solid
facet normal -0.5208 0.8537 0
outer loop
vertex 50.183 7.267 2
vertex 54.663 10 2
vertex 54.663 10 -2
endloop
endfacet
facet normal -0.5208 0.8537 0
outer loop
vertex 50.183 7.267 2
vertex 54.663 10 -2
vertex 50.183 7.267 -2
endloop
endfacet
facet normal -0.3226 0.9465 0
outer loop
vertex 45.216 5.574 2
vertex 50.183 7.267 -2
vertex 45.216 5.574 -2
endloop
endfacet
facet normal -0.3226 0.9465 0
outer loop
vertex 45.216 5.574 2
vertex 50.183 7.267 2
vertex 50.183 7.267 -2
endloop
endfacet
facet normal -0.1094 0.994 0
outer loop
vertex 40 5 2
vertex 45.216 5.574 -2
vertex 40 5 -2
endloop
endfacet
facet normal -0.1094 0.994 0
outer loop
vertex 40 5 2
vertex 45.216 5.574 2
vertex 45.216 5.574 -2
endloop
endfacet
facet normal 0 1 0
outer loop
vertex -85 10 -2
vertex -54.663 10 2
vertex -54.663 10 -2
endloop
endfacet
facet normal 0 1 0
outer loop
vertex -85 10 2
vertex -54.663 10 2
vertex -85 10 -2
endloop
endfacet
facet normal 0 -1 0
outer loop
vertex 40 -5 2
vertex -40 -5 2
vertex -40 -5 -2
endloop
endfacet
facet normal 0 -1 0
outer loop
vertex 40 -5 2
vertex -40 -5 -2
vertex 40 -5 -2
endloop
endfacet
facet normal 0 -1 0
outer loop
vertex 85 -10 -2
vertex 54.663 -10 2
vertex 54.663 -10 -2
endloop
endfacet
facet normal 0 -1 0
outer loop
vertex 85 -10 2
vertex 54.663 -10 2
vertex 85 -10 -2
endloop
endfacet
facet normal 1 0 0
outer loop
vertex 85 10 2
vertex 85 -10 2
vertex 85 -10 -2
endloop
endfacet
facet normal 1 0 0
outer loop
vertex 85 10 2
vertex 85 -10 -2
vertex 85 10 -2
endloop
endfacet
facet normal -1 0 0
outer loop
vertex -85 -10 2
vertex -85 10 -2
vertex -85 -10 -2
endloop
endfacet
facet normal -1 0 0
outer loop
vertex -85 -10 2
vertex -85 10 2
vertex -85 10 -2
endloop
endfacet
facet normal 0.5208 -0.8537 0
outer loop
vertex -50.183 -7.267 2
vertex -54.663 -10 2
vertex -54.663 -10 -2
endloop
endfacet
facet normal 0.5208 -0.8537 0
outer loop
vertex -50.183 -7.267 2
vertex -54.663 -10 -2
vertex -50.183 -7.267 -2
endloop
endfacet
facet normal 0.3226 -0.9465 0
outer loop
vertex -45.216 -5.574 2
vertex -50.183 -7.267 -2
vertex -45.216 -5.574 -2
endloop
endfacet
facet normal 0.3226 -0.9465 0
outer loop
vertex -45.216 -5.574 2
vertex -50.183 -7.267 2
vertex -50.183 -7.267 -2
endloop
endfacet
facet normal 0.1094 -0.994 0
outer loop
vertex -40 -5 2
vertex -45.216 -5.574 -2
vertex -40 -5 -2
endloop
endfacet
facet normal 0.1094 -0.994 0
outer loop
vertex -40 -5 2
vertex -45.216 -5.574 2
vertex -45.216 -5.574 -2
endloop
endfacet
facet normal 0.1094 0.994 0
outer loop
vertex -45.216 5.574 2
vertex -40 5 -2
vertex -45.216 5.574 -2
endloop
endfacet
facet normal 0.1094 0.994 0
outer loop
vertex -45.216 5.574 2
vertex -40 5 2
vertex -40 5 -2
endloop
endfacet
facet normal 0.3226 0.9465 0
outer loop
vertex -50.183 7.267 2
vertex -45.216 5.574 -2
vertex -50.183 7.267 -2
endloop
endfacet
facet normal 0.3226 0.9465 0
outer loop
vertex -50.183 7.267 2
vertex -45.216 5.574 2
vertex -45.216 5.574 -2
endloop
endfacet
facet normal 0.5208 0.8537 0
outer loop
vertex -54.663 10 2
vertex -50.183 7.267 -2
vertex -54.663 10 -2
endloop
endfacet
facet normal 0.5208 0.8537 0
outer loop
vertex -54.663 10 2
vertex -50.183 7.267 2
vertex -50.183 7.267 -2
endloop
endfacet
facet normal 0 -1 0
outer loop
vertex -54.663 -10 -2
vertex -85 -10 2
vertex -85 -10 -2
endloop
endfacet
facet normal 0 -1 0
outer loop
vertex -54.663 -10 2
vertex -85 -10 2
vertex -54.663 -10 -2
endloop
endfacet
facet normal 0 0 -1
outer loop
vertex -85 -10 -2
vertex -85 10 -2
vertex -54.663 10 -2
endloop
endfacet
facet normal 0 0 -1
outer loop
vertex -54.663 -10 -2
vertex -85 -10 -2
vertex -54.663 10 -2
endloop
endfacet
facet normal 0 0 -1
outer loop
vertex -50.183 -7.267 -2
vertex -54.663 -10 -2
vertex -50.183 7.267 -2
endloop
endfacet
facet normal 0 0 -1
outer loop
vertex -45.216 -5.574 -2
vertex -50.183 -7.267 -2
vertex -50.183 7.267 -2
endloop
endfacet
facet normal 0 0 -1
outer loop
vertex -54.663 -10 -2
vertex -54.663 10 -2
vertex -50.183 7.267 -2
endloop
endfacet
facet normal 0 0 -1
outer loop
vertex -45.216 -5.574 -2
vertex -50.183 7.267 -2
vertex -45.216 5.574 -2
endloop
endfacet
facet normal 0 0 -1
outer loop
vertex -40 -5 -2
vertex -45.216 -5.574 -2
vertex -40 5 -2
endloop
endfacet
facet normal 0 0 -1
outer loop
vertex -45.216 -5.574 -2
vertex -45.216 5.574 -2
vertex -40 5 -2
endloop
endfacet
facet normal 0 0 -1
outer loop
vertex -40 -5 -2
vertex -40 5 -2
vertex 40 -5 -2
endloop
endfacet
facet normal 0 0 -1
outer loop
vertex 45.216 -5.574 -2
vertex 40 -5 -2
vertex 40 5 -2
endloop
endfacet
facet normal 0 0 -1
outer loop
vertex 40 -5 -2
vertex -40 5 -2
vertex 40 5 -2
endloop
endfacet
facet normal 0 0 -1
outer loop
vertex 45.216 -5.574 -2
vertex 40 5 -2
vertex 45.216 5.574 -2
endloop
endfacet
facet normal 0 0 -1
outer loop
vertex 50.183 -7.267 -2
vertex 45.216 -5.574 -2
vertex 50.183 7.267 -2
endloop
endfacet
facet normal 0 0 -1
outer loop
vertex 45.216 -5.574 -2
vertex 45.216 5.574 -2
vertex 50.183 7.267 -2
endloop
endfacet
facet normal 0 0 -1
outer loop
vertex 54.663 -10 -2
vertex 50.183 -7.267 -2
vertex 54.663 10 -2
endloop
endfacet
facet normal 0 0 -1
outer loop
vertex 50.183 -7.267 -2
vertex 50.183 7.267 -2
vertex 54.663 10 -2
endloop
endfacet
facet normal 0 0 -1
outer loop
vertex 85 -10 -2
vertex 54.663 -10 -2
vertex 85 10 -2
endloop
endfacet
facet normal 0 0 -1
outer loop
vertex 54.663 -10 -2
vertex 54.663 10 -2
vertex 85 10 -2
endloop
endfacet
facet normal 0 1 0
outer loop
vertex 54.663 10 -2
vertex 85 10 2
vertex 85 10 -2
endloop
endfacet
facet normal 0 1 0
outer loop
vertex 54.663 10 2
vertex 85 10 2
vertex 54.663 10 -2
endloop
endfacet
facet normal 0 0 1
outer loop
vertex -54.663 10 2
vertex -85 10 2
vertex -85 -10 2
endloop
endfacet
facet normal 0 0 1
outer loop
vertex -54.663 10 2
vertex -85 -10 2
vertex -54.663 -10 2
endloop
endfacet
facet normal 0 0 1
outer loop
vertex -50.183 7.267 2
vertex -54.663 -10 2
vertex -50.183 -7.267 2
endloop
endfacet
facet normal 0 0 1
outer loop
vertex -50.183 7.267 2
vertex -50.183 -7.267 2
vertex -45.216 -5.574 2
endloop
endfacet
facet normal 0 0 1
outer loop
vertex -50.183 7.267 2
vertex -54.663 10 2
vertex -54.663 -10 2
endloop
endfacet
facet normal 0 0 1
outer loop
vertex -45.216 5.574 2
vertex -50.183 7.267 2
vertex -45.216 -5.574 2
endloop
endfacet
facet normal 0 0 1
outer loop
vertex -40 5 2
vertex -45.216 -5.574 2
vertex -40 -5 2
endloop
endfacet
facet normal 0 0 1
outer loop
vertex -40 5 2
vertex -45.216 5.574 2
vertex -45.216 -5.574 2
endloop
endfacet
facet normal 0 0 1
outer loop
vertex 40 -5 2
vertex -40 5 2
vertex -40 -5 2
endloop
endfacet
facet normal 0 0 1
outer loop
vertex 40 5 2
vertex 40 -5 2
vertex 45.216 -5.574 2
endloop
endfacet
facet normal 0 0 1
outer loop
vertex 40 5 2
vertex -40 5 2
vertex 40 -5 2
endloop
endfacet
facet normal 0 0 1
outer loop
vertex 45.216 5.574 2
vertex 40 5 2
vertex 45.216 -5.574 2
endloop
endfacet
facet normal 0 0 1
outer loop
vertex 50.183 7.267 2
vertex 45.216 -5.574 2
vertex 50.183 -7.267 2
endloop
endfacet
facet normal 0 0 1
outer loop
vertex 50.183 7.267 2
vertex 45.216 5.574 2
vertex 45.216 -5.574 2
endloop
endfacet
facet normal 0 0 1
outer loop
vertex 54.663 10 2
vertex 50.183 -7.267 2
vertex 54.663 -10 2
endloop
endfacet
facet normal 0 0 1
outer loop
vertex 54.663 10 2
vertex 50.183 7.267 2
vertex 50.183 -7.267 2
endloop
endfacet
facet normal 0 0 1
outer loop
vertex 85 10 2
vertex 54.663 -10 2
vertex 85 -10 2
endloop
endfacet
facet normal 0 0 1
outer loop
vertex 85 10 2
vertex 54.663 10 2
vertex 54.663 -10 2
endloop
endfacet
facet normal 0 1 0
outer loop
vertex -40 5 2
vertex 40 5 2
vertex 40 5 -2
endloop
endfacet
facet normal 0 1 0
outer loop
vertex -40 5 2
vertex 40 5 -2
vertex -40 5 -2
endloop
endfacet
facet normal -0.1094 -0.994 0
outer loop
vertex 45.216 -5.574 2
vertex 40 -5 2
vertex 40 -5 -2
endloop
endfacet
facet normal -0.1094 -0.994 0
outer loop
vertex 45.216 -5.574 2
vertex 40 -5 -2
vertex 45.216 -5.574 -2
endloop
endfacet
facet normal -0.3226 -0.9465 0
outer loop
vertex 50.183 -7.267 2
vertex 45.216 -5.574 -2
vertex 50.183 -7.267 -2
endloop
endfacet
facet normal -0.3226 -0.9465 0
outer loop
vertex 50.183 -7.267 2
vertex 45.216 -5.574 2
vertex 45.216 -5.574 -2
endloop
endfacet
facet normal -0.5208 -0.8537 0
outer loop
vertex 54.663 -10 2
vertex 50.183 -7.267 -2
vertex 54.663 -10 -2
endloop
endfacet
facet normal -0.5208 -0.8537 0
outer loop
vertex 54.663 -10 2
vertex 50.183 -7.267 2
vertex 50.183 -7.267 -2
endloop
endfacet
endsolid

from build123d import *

# Parameters (mm, degrees)
BOSS_EXTRUDE1_DEPTH = 2


with BuildPart() as part:
    # Sketch1 → Boss-Extrude1 (new body, symmetric)
    with BuildSketch(Plane.XY):
        with BuildLine():
            Line((-85, 10), (-85, -10))
            Line((-85, -10), (-54.662878299, -10))
            ThreePointArc((-54.662878299, -10), (-47.745966692, -6.284366617), (-40, -5))
            Line((-40, -5), (40, -5))
            ThreePointArc((40, -5), (47.745966692, -6.284366617), (54.662878299, -10))
            Line((54.662878299, -10), (85, -10))
            Line((85, -10), (85, 10))
            Line((85, 10), (54.662878299, 10))
            ThreePointArc((54.662878299, 10), (47.745966692, 6.284366617), (40, 5))
            Line((40, 5), (-40, 5))
            ThreePointArc((-40, 5), (-47.745966692, 6.284366617), (-54.662878299, 10))
            Line((-54.662878299, 10), (-85, 10))
        make_face()
    extrude(amount=BOSS_EXTRUDE1_DEPTH, both=True)


solid = part.part
